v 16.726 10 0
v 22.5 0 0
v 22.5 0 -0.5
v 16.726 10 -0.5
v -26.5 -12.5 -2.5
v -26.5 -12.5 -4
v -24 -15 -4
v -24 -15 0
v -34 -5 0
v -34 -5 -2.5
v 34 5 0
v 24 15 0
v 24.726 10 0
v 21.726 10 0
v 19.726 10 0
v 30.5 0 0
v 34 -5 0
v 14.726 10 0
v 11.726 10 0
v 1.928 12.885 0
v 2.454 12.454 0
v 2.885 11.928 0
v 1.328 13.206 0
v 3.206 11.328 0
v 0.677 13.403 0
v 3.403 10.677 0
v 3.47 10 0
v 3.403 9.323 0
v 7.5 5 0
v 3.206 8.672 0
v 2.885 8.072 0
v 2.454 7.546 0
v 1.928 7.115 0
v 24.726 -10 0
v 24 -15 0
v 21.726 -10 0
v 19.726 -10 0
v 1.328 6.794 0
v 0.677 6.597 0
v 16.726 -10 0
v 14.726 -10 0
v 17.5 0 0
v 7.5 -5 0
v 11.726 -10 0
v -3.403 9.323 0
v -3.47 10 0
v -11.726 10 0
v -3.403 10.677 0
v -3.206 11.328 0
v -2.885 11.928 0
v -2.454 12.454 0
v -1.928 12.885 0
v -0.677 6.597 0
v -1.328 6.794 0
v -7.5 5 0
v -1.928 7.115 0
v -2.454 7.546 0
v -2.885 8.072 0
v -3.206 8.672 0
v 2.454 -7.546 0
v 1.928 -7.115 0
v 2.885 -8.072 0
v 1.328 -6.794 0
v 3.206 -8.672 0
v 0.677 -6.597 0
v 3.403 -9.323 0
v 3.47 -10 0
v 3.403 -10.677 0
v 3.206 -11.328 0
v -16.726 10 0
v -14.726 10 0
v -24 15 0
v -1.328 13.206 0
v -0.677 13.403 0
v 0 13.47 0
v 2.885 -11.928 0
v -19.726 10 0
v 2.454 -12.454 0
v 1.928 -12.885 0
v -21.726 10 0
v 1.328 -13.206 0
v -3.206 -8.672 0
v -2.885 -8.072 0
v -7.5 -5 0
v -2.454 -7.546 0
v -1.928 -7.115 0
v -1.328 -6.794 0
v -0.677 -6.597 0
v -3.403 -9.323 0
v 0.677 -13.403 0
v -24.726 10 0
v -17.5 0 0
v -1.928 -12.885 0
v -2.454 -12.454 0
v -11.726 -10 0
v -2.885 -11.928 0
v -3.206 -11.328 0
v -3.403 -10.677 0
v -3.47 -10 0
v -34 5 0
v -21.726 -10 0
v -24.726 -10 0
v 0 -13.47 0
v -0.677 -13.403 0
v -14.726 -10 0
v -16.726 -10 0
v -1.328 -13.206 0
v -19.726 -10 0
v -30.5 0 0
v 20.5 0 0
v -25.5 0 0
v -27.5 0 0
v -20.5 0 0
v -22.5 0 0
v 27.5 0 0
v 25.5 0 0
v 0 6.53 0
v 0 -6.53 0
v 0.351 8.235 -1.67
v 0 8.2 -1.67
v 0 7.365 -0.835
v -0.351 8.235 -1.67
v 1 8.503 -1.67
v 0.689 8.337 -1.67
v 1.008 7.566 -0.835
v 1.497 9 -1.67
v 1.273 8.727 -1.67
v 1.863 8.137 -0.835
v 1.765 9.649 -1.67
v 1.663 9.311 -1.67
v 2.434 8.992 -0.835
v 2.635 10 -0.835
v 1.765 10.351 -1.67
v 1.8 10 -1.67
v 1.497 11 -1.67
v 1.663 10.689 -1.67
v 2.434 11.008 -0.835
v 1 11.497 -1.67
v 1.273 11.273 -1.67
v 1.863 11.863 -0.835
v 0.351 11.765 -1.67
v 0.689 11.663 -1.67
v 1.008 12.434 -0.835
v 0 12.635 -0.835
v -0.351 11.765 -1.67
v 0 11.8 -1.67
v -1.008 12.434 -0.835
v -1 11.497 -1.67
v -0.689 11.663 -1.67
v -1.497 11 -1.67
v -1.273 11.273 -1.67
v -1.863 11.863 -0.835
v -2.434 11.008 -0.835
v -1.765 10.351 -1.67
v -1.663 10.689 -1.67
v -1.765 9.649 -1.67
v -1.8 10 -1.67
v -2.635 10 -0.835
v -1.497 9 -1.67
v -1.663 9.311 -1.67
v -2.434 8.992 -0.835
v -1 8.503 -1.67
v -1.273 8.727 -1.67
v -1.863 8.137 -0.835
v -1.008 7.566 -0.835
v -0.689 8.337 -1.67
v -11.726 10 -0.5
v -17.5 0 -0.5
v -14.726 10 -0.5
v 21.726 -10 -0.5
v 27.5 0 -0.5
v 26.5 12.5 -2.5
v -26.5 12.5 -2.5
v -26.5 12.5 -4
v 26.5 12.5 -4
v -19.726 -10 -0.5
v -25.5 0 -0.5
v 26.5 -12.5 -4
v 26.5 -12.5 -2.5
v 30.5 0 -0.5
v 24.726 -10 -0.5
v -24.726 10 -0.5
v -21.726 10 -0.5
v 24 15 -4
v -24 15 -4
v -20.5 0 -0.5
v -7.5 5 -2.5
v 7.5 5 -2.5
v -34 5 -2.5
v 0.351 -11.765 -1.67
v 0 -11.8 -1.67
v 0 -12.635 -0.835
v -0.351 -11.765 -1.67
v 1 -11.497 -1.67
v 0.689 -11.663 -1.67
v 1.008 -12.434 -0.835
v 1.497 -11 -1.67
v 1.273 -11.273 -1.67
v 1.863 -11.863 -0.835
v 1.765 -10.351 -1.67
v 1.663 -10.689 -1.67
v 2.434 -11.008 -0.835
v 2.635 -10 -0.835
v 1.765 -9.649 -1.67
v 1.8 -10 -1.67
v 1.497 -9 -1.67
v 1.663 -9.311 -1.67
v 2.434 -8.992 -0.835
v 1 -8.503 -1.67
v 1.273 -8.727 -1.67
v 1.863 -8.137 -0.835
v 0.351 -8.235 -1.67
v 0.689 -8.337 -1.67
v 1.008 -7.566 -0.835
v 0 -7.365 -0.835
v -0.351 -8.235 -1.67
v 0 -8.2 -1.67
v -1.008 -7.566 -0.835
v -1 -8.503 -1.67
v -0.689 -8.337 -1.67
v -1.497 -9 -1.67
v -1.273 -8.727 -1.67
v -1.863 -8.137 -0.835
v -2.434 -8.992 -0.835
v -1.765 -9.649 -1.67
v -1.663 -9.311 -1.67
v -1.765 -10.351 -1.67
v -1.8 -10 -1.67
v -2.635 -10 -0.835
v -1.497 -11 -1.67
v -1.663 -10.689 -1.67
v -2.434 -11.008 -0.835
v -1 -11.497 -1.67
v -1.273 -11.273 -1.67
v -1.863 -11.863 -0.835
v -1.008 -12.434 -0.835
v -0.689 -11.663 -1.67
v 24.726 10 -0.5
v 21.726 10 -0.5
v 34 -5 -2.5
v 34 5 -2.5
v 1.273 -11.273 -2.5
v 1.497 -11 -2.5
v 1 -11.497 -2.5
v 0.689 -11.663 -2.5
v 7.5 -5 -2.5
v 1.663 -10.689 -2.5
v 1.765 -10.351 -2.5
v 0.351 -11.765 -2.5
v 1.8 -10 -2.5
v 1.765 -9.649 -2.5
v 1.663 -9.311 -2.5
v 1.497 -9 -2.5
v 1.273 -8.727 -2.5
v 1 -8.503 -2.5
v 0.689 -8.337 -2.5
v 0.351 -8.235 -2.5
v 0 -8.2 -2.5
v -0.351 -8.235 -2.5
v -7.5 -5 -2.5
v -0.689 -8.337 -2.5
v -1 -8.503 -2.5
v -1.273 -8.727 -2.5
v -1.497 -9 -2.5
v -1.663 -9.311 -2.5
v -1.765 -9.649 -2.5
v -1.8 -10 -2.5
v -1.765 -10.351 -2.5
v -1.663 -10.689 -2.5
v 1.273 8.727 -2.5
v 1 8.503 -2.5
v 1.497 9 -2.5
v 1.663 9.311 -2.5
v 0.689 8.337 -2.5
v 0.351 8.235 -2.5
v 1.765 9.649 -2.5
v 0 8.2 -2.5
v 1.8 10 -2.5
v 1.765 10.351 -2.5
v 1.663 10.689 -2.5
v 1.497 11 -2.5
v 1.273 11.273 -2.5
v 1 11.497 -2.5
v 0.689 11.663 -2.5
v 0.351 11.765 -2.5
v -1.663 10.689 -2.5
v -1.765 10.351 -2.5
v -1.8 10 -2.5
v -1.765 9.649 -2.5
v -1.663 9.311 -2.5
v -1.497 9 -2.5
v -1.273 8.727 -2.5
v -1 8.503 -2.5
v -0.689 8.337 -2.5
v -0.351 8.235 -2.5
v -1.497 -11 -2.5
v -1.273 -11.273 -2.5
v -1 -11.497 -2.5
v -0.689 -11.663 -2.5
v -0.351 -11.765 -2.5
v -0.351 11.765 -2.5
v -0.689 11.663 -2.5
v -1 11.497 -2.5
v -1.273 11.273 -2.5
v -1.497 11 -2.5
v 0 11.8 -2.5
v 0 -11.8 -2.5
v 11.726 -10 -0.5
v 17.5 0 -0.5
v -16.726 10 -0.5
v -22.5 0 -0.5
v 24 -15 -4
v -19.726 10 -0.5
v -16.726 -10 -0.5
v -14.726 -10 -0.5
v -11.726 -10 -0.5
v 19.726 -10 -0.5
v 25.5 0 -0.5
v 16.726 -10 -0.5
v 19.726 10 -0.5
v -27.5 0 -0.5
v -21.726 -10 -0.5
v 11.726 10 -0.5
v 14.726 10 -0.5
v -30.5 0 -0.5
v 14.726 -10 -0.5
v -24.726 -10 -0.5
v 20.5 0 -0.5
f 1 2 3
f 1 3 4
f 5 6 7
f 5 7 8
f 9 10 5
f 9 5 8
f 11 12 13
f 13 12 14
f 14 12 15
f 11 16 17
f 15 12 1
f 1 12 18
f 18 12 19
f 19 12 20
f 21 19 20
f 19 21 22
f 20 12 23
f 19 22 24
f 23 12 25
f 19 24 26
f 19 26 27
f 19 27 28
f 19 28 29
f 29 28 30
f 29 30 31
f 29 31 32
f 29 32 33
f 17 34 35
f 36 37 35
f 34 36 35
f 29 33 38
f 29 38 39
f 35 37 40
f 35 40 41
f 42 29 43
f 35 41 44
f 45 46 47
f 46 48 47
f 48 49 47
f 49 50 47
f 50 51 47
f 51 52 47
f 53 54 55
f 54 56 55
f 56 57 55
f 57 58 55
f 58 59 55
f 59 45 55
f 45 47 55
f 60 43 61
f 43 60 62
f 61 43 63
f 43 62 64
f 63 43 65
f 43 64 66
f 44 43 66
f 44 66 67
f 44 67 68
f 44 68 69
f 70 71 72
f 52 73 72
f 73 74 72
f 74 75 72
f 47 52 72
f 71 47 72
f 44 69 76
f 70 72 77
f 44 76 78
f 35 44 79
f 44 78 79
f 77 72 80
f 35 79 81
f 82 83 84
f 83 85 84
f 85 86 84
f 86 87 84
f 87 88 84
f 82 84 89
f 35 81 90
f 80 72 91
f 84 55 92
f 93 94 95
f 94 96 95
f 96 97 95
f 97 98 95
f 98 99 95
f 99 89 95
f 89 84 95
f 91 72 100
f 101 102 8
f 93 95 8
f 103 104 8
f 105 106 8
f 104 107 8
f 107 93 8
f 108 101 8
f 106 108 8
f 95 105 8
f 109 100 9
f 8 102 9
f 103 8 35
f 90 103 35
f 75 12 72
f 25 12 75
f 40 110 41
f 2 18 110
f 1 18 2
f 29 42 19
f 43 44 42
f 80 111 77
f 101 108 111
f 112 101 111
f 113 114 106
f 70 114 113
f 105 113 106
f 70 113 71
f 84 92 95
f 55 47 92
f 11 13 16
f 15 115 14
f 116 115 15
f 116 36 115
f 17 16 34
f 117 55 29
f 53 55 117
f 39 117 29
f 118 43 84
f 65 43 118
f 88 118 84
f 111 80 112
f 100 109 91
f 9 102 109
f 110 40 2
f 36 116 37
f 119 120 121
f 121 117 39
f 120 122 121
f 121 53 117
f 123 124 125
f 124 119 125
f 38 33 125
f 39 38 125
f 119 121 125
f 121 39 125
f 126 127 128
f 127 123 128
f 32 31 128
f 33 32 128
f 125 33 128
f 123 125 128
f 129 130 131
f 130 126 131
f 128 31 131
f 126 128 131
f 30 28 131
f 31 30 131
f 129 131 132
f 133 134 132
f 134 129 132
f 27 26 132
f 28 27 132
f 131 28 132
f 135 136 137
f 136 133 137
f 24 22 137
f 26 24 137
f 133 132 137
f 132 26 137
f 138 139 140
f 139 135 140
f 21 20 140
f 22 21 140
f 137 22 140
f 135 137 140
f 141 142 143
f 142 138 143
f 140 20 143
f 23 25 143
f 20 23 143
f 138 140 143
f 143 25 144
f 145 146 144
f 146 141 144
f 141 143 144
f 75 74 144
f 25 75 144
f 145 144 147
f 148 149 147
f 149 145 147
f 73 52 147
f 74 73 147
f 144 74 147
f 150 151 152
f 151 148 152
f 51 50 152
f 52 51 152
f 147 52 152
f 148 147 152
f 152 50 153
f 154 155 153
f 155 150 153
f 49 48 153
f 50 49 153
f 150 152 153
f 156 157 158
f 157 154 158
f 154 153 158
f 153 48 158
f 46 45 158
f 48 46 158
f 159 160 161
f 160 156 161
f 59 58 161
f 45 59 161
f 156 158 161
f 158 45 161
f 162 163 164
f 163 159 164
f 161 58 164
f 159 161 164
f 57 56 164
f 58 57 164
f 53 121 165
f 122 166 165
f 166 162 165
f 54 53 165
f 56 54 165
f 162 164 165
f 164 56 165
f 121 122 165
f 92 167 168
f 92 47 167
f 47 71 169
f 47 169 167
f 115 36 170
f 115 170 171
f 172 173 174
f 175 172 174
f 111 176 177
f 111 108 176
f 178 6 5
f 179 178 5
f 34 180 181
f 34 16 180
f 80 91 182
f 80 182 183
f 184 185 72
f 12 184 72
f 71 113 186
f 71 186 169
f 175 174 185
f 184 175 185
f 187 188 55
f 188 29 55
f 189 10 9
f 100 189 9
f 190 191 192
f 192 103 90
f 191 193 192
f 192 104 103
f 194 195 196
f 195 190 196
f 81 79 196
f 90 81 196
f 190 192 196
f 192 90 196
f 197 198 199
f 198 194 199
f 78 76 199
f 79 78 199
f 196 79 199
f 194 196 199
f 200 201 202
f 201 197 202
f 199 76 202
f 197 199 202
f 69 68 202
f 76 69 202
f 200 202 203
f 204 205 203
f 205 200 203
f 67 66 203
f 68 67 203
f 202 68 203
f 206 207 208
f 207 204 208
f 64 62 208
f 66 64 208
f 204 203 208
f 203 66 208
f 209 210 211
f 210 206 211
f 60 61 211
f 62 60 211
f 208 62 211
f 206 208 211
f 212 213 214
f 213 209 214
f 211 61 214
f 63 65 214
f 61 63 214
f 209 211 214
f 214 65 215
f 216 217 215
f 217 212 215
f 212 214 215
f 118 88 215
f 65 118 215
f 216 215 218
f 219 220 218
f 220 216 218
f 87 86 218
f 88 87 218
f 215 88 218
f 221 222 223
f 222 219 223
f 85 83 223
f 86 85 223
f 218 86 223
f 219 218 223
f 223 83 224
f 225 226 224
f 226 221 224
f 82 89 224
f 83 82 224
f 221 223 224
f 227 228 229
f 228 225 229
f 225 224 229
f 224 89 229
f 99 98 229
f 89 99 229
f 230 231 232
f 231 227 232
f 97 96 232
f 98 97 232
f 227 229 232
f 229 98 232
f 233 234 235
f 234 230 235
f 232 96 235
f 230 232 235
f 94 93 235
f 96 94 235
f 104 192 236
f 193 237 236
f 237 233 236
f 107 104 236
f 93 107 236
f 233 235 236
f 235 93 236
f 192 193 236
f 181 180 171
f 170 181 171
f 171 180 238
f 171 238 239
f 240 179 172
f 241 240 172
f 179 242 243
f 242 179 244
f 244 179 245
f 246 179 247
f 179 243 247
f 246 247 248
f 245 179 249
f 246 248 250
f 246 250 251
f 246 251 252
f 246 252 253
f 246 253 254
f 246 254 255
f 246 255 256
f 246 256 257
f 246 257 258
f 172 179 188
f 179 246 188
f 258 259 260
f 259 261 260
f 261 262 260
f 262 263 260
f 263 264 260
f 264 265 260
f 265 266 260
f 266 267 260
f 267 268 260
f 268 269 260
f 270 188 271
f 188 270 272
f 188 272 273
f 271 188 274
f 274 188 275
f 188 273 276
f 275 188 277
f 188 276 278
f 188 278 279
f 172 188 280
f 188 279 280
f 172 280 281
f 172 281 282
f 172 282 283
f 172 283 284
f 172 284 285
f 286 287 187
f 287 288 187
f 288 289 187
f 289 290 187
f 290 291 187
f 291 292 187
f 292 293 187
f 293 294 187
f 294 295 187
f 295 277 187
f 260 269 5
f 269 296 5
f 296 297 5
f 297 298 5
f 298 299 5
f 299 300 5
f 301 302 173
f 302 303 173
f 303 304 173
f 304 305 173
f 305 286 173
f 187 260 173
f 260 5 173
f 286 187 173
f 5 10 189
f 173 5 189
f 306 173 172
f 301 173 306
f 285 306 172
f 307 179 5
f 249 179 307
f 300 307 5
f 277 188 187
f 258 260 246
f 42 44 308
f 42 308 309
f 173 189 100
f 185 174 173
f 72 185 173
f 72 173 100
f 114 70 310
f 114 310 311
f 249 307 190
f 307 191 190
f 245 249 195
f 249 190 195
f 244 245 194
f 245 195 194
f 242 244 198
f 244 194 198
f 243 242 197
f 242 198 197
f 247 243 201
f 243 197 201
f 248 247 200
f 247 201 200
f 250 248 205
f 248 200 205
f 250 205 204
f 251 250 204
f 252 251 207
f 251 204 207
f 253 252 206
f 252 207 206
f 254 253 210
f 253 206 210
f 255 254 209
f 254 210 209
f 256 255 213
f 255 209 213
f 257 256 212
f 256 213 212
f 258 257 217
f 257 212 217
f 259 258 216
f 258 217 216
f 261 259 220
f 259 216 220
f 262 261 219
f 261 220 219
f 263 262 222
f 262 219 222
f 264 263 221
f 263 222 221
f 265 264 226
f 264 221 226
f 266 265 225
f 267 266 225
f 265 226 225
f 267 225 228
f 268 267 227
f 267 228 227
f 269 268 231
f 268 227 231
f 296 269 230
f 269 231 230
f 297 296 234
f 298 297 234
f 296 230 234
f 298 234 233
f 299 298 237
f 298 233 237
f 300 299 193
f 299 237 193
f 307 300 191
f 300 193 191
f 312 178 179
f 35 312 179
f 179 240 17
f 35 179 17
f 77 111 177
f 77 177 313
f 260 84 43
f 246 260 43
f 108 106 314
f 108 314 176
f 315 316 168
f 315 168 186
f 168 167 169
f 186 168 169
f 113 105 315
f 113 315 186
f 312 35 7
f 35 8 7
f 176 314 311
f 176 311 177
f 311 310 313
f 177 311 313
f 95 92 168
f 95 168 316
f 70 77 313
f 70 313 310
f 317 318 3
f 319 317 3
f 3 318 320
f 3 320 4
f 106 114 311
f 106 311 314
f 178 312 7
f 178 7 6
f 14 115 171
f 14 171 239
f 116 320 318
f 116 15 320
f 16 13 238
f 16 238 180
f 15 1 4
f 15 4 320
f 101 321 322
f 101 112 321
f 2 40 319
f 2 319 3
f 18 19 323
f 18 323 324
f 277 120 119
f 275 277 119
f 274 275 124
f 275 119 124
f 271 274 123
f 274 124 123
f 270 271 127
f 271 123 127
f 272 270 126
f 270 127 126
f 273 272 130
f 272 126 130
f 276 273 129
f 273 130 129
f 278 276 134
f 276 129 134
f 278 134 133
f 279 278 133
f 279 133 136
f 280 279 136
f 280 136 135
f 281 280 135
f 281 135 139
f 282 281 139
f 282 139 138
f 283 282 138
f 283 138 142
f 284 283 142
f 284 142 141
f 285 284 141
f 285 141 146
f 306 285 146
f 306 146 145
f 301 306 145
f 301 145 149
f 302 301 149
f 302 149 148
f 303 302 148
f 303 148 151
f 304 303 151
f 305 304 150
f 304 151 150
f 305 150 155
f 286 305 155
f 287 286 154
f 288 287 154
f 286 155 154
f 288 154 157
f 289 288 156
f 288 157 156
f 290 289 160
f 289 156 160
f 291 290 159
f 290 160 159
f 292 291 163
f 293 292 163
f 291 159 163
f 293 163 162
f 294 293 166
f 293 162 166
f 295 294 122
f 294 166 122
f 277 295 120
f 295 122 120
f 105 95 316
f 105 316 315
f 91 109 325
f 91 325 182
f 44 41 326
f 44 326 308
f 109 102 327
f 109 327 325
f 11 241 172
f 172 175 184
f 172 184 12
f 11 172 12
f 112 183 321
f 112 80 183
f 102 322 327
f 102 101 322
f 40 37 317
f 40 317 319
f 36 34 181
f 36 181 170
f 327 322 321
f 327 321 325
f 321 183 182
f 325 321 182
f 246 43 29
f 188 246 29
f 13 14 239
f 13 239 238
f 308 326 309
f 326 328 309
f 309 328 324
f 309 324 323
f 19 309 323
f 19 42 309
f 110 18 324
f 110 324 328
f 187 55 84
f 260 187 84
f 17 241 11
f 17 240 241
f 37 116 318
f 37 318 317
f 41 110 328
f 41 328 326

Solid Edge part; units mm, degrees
sketch "Sketch1" plane through (0, 0, 0) normal (1, 0, 0) x (0, 1, 0)
  line L0 (-15, 0) -> (-15, -4)
  line L1 (-15, -4) -> (-12.5, -4)
  line L2 (-12.5, -4) -> (-12.5, -2.5)
  line L3 (-12.5, -2.5) -> (12.5, -2.5)
  line L4 (12.5, -2.5) -> (12.5, -4)
  line L5 (12.5, -4) -> (15, -4)
  line L6 (15, -4) -> (15, 0)
  line L7 (15, 0) -> (-15, 0)
  dimension "D1" = 25
  dimension "D2" = 30
  dimension "D3" = 4
  dimension "D4" = 1.5
extrude "Protrusion1" add sketch "Sketch1" along normal mid plane 68
hole "Hole_1" at (0, -10, 0) direction (0, 0, -1) diameter 3.6 end up to next countersink diameter 6.94 countersink angle 90
hole "Hole1" at (0, 10, 0) direction (0, 0, -1) diameter 3.6 end up to next countersink diameter 6.94 countersink angle 90
chamfer "Chamfer_1" distance 10 angle 45 4 edges at (34, 15, -2) (34, -15, -2) (-34, 15, -2) (-34, -15, -2)
sketch "Sketch2" plane through (0, 0, 0) normal (0, 0, 1) x (1, 0, 0)
  line L0 (-7.5, -5) -> (7.5, -5)
  line L1 (7.5, -5) -> (7.5, 5)
  line L2 (7.5, 5) -> (-7.5, 5)
  line L3 (-7.5, 5) -> (-7.5, -5)
  dimension "D1" = 10
  dimension "D2" = 15
extrude "Cutout1" cut sketch "Sketch2" against normal up to next
sketch "Sketch3" plane through (0, 0, 0) normal (0, 0, 1) x (1, 0, 0)
  line L0 (-20.5, 0) -> (-14.7265, 10)
  line L1 (-14.7265, 10) -> (-11.7265, 10)
  line L2 (-11.7265, 10) -> (-17.5, 0)
  line L3 (-17.5, 0) -> (-11.7265, -10)
  line L4 (-11.7265, -10) -> (-14.7265, -10)
  line L5 (-14.7265, -10) -> (-20.5, 0)
  dimension "D1" = 3
  dimension "D2" = 10
  dimension "D3" = 10
extrude "deco_cutout" cut sketch "Sketch3" against normal blind 0.5
pattern_linear "Pattern2" count 3 spacing 5 along (-1, 0, 0) of "deco_cutout"
mirror "Mirror1" about plane through (0, 0, 0) normal (1, 0, 0) of "deco_cutout", "Pattern2"
properties material "Polyethylene, low density"
